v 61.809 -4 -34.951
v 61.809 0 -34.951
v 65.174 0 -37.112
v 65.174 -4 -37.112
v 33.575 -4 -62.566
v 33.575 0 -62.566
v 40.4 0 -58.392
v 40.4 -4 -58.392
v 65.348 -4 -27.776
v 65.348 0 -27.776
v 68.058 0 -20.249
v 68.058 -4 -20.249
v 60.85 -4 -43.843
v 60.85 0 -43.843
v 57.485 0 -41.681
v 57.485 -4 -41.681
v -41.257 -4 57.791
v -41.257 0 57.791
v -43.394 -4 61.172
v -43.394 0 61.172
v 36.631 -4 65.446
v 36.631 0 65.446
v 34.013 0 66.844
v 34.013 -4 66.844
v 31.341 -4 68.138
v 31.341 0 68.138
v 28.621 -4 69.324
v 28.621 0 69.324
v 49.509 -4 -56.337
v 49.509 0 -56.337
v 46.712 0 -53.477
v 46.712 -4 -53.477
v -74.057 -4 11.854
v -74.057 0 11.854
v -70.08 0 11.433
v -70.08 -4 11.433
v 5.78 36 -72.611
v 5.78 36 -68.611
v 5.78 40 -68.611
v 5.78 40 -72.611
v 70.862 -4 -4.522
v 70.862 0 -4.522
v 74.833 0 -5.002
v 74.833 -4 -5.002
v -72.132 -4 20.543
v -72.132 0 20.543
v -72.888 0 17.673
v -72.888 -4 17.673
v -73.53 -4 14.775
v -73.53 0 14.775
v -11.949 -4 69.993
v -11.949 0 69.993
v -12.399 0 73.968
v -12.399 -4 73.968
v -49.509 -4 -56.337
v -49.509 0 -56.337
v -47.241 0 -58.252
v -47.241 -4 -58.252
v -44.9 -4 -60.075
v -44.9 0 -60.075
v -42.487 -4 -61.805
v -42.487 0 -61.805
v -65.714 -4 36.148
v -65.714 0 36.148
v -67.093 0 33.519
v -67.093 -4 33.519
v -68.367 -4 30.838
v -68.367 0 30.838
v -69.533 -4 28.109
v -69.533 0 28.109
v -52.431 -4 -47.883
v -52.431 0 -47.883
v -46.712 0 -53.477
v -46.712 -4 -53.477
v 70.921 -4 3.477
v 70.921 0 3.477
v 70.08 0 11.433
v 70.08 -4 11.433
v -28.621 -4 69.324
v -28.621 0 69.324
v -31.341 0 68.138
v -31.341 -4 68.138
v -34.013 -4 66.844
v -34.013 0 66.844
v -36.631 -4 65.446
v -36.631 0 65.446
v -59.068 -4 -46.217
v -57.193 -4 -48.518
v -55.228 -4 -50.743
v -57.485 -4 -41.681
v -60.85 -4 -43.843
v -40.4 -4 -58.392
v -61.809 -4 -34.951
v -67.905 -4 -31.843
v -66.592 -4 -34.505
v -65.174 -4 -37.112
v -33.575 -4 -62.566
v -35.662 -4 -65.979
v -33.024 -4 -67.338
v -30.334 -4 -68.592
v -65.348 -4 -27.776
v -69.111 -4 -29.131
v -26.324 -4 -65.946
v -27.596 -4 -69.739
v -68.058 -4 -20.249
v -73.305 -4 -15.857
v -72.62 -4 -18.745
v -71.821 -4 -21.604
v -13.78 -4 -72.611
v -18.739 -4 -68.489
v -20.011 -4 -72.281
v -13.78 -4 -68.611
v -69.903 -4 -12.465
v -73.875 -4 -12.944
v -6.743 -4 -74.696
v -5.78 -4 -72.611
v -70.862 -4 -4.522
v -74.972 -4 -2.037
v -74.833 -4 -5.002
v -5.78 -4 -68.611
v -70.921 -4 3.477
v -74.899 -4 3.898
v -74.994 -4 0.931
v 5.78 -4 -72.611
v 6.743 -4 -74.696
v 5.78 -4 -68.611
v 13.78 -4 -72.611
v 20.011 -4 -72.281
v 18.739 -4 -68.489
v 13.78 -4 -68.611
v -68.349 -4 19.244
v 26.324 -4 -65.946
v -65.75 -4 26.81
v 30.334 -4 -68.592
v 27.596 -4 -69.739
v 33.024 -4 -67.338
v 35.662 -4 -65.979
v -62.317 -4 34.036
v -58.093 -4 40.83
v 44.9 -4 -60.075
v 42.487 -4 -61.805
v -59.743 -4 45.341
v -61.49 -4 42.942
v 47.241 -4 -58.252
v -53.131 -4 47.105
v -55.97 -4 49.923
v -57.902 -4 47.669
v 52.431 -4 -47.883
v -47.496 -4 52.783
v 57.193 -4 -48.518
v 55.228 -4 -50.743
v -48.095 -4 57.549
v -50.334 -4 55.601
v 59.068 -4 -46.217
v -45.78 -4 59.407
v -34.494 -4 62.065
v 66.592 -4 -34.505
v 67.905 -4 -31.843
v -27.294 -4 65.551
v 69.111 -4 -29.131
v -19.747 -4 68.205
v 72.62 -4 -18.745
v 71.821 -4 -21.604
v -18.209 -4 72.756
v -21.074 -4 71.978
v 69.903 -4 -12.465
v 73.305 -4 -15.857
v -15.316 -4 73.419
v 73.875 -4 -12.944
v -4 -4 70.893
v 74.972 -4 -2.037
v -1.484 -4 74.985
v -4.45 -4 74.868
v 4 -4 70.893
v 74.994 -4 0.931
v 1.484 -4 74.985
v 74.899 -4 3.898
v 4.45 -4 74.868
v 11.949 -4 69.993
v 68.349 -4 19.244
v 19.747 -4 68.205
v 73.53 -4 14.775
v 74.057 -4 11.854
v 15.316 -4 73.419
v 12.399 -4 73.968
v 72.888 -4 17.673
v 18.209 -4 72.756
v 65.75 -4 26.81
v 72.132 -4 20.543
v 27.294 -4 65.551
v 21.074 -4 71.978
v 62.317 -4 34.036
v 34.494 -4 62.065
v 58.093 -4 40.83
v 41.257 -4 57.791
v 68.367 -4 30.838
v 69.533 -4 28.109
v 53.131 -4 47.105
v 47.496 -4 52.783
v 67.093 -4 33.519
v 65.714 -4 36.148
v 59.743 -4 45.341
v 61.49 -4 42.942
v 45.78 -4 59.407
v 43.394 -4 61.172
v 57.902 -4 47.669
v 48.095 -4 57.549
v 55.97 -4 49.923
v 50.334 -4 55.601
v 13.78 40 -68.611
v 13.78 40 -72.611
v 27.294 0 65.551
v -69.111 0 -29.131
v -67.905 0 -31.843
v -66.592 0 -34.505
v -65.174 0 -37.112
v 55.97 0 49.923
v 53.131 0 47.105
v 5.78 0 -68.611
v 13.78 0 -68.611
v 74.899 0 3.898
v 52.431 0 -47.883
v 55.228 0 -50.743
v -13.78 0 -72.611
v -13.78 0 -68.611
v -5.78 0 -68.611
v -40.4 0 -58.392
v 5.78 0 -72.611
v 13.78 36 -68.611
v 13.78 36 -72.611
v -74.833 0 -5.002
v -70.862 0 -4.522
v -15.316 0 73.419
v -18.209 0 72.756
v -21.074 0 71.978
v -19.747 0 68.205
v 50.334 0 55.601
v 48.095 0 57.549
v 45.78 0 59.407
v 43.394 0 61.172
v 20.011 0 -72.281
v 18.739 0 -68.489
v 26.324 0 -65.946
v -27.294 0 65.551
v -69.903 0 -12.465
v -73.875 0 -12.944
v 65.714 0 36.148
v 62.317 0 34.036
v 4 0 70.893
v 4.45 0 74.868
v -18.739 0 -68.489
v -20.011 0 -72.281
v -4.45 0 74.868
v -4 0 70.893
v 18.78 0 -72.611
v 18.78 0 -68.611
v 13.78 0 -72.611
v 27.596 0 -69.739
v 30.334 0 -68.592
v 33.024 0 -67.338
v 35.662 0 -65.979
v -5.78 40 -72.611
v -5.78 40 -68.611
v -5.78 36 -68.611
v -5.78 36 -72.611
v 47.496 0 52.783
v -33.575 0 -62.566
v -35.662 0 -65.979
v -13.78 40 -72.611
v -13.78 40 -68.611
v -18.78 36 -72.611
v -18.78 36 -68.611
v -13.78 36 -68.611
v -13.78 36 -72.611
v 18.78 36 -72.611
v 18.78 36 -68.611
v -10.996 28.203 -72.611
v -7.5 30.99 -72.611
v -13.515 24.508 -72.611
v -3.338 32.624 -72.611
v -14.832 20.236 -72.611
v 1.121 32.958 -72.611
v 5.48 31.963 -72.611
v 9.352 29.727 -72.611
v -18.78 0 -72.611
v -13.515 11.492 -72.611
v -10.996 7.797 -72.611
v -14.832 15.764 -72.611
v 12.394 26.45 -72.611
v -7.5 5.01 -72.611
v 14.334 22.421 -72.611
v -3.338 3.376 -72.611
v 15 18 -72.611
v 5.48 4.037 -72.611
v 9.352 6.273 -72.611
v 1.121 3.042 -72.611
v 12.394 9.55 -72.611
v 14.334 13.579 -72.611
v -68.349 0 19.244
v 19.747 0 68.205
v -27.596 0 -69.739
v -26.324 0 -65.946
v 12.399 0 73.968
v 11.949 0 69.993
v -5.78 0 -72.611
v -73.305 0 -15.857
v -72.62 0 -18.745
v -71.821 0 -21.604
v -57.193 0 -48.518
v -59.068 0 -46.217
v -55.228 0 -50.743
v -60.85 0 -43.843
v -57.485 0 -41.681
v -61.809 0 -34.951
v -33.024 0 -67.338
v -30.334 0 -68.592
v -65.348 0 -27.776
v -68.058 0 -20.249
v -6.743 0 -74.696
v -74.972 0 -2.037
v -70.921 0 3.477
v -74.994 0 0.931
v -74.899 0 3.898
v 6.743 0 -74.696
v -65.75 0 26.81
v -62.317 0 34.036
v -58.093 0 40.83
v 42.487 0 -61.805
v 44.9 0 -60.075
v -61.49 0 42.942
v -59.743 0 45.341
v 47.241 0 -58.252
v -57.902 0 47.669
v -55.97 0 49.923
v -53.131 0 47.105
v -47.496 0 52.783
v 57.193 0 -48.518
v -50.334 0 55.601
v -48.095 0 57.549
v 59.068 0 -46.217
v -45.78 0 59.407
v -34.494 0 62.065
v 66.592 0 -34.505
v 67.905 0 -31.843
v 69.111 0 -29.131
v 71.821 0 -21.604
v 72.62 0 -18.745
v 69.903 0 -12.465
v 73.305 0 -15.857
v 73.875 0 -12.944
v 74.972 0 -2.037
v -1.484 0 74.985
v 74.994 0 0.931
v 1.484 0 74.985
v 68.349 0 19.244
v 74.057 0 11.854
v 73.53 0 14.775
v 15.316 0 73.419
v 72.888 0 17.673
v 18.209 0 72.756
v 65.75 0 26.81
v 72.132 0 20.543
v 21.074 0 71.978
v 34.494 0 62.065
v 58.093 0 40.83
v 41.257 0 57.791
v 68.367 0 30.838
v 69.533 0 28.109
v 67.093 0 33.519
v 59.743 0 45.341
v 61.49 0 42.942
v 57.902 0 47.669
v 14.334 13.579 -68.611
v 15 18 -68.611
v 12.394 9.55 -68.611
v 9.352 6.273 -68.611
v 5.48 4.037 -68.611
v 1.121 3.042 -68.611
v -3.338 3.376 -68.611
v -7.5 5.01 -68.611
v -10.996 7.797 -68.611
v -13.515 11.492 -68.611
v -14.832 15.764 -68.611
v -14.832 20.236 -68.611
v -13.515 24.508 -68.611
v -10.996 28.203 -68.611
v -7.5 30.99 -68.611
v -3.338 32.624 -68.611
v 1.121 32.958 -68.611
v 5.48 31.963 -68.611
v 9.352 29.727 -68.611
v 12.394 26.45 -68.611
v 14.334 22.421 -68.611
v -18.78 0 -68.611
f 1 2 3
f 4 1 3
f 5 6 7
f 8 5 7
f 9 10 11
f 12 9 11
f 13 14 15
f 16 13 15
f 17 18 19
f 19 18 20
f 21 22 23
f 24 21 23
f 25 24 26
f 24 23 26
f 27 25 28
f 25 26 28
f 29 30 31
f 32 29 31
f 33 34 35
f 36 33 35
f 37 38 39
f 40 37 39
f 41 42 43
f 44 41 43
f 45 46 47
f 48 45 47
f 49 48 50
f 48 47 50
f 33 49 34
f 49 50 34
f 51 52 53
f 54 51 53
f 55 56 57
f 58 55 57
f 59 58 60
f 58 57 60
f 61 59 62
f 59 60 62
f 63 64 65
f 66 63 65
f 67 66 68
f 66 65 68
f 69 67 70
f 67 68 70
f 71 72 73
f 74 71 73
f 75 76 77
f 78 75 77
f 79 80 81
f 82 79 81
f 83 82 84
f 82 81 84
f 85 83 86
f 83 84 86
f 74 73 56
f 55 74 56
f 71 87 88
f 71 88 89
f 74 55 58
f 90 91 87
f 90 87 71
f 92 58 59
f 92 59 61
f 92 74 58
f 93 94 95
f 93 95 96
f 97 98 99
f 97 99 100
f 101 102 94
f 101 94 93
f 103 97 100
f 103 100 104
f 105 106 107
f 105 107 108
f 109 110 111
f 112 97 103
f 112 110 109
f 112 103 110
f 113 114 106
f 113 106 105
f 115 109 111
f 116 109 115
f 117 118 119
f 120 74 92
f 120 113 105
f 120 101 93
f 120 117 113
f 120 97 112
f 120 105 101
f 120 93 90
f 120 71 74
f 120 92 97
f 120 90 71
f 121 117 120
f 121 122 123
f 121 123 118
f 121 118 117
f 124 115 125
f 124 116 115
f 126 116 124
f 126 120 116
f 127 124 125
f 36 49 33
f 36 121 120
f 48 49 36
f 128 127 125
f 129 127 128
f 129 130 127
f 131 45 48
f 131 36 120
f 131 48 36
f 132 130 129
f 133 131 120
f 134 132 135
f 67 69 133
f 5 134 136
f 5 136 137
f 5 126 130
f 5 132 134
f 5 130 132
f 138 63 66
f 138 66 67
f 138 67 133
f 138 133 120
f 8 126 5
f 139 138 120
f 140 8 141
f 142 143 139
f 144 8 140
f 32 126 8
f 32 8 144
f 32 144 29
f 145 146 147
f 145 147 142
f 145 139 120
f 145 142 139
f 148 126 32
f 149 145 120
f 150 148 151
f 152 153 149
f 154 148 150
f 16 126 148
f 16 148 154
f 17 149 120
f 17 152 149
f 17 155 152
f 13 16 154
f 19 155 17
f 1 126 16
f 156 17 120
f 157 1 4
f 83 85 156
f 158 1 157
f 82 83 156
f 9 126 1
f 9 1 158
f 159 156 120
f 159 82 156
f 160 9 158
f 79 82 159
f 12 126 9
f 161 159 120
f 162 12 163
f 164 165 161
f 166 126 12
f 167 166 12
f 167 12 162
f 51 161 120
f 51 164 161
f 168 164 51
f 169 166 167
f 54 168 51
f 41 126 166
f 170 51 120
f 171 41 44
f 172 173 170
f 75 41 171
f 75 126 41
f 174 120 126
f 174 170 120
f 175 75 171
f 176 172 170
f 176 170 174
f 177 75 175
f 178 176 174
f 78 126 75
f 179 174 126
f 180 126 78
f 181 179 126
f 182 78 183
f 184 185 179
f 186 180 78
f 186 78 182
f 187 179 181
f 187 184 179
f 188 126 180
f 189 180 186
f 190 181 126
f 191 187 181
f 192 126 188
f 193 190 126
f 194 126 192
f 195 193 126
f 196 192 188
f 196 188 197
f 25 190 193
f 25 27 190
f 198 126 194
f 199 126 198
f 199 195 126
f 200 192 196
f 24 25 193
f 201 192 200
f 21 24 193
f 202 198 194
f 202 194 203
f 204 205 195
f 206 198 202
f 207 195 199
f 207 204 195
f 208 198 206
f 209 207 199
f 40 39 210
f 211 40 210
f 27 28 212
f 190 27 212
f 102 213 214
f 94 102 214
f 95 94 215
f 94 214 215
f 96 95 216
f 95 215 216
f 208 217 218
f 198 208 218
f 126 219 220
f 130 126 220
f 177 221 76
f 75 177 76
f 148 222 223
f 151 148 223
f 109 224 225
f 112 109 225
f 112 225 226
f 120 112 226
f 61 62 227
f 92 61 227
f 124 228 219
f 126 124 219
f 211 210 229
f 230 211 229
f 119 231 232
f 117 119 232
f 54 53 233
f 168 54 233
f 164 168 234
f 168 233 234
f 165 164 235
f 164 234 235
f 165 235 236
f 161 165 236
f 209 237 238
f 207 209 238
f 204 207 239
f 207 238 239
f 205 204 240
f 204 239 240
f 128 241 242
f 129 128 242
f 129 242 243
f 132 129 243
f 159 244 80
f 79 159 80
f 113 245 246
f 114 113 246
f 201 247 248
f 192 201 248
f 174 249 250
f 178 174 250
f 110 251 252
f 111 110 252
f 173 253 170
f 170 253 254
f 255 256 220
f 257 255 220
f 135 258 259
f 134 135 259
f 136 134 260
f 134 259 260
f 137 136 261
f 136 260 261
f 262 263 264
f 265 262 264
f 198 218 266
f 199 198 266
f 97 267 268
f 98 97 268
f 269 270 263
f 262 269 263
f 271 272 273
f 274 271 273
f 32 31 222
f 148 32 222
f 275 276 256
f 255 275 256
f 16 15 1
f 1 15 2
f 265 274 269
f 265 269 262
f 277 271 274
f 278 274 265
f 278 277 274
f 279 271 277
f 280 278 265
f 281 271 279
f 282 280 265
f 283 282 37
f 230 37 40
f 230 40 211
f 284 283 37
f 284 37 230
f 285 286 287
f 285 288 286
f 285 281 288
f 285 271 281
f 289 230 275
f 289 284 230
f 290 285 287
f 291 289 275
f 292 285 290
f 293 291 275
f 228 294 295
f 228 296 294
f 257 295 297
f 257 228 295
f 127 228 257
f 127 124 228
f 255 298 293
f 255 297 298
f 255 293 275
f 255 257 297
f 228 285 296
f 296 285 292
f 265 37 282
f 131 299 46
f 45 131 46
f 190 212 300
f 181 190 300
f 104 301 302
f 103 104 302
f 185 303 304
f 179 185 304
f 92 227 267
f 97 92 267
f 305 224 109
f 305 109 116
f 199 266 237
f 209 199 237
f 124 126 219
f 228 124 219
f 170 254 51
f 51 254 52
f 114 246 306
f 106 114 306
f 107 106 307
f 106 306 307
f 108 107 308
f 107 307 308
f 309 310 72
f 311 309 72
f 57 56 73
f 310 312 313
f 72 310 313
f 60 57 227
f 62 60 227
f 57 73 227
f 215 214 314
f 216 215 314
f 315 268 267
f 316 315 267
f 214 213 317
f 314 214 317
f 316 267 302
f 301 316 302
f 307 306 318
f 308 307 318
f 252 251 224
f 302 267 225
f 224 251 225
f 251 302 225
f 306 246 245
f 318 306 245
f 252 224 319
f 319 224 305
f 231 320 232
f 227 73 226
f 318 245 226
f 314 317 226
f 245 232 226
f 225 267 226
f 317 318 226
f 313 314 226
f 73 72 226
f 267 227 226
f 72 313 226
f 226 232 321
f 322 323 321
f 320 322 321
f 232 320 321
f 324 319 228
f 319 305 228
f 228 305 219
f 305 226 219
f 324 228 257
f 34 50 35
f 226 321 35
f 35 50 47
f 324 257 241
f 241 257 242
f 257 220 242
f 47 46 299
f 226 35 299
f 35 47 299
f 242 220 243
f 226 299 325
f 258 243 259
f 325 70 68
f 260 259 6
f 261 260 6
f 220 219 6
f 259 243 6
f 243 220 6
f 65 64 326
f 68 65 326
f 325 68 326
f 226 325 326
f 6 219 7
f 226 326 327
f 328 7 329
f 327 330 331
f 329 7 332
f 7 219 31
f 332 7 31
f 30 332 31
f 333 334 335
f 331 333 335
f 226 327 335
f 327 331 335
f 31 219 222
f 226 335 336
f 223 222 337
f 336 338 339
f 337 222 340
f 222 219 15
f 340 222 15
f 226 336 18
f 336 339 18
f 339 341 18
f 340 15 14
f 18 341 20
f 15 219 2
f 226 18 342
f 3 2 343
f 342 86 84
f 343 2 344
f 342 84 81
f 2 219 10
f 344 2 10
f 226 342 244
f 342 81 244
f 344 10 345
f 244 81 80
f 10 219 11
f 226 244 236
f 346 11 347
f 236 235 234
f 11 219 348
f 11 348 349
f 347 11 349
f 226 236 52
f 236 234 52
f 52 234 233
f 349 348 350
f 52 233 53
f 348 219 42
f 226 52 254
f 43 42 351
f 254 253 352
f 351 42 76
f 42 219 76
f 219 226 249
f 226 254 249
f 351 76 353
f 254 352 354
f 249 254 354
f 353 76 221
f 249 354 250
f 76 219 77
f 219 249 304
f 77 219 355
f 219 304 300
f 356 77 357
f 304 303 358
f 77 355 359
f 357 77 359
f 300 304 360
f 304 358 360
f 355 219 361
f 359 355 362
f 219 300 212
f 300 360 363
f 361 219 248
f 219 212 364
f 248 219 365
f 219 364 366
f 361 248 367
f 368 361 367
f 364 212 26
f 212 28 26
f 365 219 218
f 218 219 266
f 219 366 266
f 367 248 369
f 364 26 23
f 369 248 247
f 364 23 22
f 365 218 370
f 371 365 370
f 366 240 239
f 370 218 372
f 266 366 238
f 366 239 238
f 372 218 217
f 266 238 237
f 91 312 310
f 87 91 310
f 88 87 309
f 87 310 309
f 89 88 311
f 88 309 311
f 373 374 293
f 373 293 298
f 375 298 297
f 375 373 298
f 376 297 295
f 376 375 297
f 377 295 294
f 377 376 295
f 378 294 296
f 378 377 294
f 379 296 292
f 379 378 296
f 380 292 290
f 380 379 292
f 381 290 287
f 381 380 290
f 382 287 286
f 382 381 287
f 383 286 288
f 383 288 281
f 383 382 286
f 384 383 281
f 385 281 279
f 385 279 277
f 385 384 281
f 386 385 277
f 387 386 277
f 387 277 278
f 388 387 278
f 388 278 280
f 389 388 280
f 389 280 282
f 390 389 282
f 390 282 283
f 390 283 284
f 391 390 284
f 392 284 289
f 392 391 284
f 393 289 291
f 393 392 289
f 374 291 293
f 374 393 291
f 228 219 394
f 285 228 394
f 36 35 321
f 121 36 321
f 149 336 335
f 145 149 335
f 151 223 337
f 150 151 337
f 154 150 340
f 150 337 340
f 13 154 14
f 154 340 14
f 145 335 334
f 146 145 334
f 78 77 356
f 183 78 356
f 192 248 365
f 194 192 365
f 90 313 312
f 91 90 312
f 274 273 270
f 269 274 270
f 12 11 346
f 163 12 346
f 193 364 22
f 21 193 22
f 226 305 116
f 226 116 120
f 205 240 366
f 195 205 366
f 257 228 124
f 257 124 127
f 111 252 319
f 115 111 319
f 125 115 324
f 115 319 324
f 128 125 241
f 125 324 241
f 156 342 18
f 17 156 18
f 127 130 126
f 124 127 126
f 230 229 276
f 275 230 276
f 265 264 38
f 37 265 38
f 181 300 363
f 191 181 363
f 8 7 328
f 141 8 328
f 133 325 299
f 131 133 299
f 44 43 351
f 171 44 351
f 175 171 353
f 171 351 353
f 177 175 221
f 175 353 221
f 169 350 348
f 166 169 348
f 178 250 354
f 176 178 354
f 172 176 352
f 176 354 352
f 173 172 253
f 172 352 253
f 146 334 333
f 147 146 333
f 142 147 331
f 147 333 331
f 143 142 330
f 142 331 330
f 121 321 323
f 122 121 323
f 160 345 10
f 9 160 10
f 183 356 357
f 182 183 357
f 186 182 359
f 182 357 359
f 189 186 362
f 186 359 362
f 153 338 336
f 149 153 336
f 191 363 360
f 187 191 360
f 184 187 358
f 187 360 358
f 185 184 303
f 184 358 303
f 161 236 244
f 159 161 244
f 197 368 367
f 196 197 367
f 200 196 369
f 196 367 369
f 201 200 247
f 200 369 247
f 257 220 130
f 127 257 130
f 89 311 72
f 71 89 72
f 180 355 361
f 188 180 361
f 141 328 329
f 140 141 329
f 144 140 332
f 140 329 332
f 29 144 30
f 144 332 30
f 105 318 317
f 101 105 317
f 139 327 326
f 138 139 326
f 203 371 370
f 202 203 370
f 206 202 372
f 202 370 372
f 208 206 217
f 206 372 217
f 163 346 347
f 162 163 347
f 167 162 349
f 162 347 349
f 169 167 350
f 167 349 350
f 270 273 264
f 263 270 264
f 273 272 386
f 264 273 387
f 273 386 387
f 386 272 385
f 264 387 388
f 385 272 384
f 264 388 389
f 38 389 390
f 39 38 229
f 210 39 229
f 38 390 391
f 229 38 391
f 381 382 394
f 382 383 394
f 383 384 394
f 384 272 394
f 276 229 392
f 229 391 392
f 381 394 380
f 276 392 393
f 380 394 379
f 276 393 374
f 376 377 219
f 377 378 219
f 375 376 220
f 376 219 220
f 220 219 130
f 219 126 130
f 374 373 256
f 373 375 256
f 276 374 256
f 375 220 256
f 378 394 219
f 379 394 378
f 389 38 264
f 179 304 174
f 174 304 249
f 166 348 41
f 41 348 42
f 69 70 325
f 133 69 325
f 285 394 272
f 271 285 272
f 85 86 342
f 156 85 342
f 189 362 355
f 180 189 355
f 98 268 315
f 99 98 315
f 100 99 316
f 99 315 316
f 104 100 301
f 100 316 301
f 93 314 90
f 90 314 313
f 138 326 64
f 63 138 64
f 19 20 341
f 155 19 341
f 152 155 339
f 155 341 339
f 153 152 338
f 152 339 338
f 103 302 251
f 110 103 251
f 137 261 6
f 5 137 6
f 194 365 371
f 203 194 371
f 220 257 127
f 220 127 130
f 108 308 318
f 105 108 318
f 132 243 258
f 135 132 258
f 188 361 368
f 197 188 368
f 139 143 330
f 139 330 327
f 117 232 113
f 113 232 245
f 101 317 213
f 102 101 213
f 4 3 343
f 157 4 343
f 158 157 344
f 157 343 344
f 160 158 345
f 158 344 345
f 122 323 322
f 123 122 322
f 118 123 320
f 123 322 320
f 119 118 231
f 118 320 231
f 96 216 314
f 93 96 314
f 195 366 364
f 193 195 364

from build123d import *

# Parameters (mm, degrees)
F0_W     = 8
F0_H     = 4
F1_DEPTH = 4
F2_R     = 15
F3_DEPTH = 4


with BuildPart() as f1:
    # F0 (on Front) → F1 (new body)
    with BuildSketch(Plane.XZ):
        with BuildLine():
            Line((-18.739275, -68.488638), (-20.010588, -72.281231))
            ThreePointArc((-20.010588, -72.281231), (0, -75), (20.010588, -72.281231))
            Line((20.010588, -72.281231), (18.739275, -68.488638))
            Line((18.739275, -68.488638), (26.324462, -65.946013))
            Line((26.324462, -65.946013), (27.595775, -69.738606))
            ThreePointArc((27.595775, -69.738606), (31.684936, -67.978414), (35.662457, -65.978703))
            Line((35.662457, -65.978703), (33.575493, -62.566286))
            Line((33.575493, -62.566286), (40.400325, -58.39236))
            Line((40.400325, -58.39236), (42.487289, -61.804776))
            ThreePointArc((42.487289, -61.804776), (46.07948, -59.175008), (49.509311, -56.336738))
            Line((49.509311, -56.336738), (46.712326, -53.477215))
            Line((46.712326, -53.477215), (52.431373, -47.883244))
            Line((52.431373, -47.883244), (55.228358, -50.742768))
            ThreePointArc((55.228358, -50.742768), (58.141764, -47.376526), (60.85031, -43.843355))
            Line((60.85031, -43.843355), (57.484869, -41.681456))
            Line((57.484869, -41.681456), (61.808667, -34.950574))
            Line((61.808667, -34.950574), (65.174108, -37.112473))
            ThreePointArc((65.174108, -37.112473), (67.26127, -33.180137), (69.11144, -29.130892))
            Line((69.11144, -29.130892), (65.347881, -27.776039))
            Line((65.347881, -27.776039), (68.057587, -20.248921))
            Line((68.057587, -20.248921), (71.821146, -21.603774))
            ThreePointArc((71.821146, -21.603774), (72.976425, -17.304374), (73.874575, -12.944001))
            Line((73.874575, -12.944001), (69.903387, -12.464769))
            Line((69.903387, -12.464769), (70.861851, -4.522393))
            Line((70.861851, -4.522393), (74.833039, -5.001625))
            ThreePointArc((74.833039, -5.001625), (74.997963, -0.552769), (74.898634, 3.898034))
            Line((74.898634, 3.898034), (70.920813, 3.47739))
            Line((70.920813, 3.47739), (70.079524, 11.433032))
            Line((70.079524, 11.433032), (74.057345, 11.853676))
            ThreePointArc((74.057345, 11.853676), (73.223565, 16.226813), (72.131785, 20.542775))
            Line((72.131785, 20.542775), (68.348664, 19.243545))
            Line((68.348664, 19.243545), (65.750204, 26.809786))
            Line((65.750204, 26.809786), (69.533324, 28.109016))
            ThreePointArc((69.533324, 28.109016), (67.743042, 32.185094), (65.714069, 36.147768))
            Line((65.714069, 36.147768), (62.317127, 34.035711))
            Line((62.317127, 34.035711), (58.093013, 40.829595))
            Line((58.093013, 40.829595), (61.489955, 42.941652))
            ThreePointArc((61.489955, 42.941652), (58.833783, 46.514363), (55.970312, 49.923183))
            Line((55.970312, 49.923183), (53.131481, 47.105198))
            Line((53.131481, 47.105198), (47.495511, 52.78286))
            Line((47.495511, 52.78286), (50.334342, 55.600845))
            ThreePointArc((50.334342, 55.600845), (46.94672, 58.489362), (43.393682, 61.171794))
            Line((43.393682, 61.171794), (41.256646, 57.79051))
            Line((41.256646, 57.79051), (34.494079, 62.064583))
            Line((34.494079, 62.064583), (36.631116, 65.445866))
            ThreePointArc((36.631116, 65.445866), (32.683503, 67.50399), (28.620731, 69.324265))
            Line((28.620731, 69.324265), (27.293654, 65.550823))
            Line((27.293654, 65.550823), (19.74677, 68.204978))
            Line((19.74677, 68.204978), (21.073847, 71.97842))
            ThreePointArc((21.073847, 71.97842), (16.766049, 73.101981), (12.399175, 73.967969))
            Line((12.399175, 73.967969), (11.949225, 69.993357))
            Line((11.949225, 69.993357), (4, 70.893257))
            Line((4, 70.893257), (4.44995, 74.86787))
            ThreePointArc((4.44995, 74.86787), (0, 75), (-4.44995, 74.86787))
            Line((-4.44995, 74.86787), (-4, 70.893257))
            Line((-4, 70.893257), (-11.949225, 69.993357))
            Line((-11.949225, 69.993357), (-12.399175, 73.967969))
            ThreePointArc((-12.399175, 73.967969), (-16.766049, 73.101981), (-21.073847, 71.97842))
            Line((-21.073847, 71.97842), (-19.74677, 68.204978))
            Line((-19.74677, 68.204978), (-27.293654, 65.550823))
            Line((-27.293654, 65.550823), (-28.620731, 69.324265))
            ThreePointArc((-28.620731, 69.324265), (-32.683503, 67.50399), (-36.631116, 65.445866))
            Line((-36.631116, 65.445866), (-34.494079, 62.064583))
            Line((-34.494079, 62.064583), (-41.256646, 57.79051))
            Line((-41.256646, 57.79051), (-43.393682, 61.171794))
            ThreePointArc((-43.393682, 61.171794), (-46.94672, 58.489362), (-50.334342, 55.600845))
            Line((-50.334342, 55.600845), (-47.495511, 52.78286))
            Line((-47.495511, 52.78286), (-53.131481, 47.105198))
            Line((-53.131481, 47.105198), (-55.970312, 49.923183))
            ThreePointArc((-55.970312, 49.923183), (-58.833783, 46.514363), (-61.489955, 42.941652))
            Line((-61.489955, 42.941652), (-58.093013, 40.829595))
            Line((-58.093013, 40.829595), (-62.317127, 34.035711))
            Line((-62.317127, 34.035711), (-65.714069, 36.147768))
            ThreePointArc((-65.714069, 36.147768), (-67.743042, 32.185094), (-69.533324, 28.109016))
            Line((-69.533324, 28.109016), (-65.750204, 26.809786))
            Line((-65.750204, 26.809786), (-68.348664, 19.243545))
            Line((-68.348664, 19.243545), (-72.131785, 20.542775))
            ThreePointArc((-72.131785, 20.542775), (-73.223565, 16.226813), (-74.057345, 11.853676))
            Line((-74.057345, 11.853676), (-70.079524, 11.433032))
            Line((-70.079524, 11.433032), (-70.920813, 3.47739))
            Line((-70.920813, 3.47739), (-74.898634, 3.898034))
            ThreePointArc((-74.898634, 3.898034), (-74.997963, -0.552769), (-74.833039, -5.001625))
            Line((-74.833039, -5.001625), (-70.861851, -4.522393))
            Line((-70.861851, -4.522393), (-69.903387, -12.464769))
            Line((-69.903387, -12.464769), (-73.874575, -12.944001))
            ThreePointArc((-73.874575, -12.944001), (-72.976425, -17.304374), (-71.821146, -21.603774))
            Line((-71.821146, -21.603774), (-68.057587, -20.248921))
            Line((-68.057587, -20.248921), (-65.347881, -27.776039))
            Line((-65.347881, -27.776039), (-69.11144, -29.130892))
            ThreePointArc((-69.11144, -29.130892), (-67.26127, -33.180137), (-65.174108, -37.112473))
            Line((-65.174108, -37.112473), (-61.808667, -34.950574))
            Line((-61.808667, -34.950574), (-57.484869, -41.681456))
            Line((-57.484869, -41.681456), (-60.85031, -43.843355))
            ThreePointArc((-60.85031, -43.843355), (-58.141764, -47.376526), (-55.228358, -50.742768))
            Line((-55.228358, -50.742768), (-52.431373, -47.883244))
            Line((-52.431373, -47.883244), (-46.712326, -53.477215))
            Line((-46.712326, -53.477215), (-49.509311, -56.336738))
            ThreePointArc((-49.509311, -56.336738), (-46.07948, -59.175008), (-42.487289, -61.804776))
            Line((-42.487289, -61.804776), (-40.400325, -58.39236))
            Line((-40.400325, -58.39236), (-33.575493, -62.566286))
            Line((-33.575493, -62.566286), (-35.662457, -65.978703))
            ThreePointArc((-35.662457, -65.978703), (-31.684936, -67.978414), (-27.595775, -69.738606))
            Line((-27.595775, -69.738606), (-26.324462, -65.946013))
            Line((-26.324462, -65.946013), (-18.739275, -68.488638))
        make_face()
        with Locations((-9.780172, -70.610641)):
            Rectangle(F0_W, F0_H, mode=Mode.SUBTRACT)
        with Locations((9.780172, -70.610641)):
            Rectangle(F0_W, F0_H, mode=Mode.SUBTRACT)
    extrude(amount=F1_DEPTH)


with BuildPart() as f3:
    # F2 (on face) → F3 (new body)
    with BuildSketch(Plane(origin=(0, 0, -68.610641), x_dir=(1, 0, 0), z_dir=(0, 0, -1))):
        Polygon((5.780172, 0), (-5.780172, 0), (-13.780172, 0), (-18.780172, 0), (-18.780172, -36), (-13.780172, -36), (-13.780172, -40), (-5.780172, -40), (-5.780172, -36), (5.780172, -36), (5.780172, -40), (13.780172, -40), (13.780172, -36), (18.780172, -36), (18.780172, 0), (13.780172, 0), (13.780172, 4), (5.780172, 4), align=None)
        with Locations((0, -18)):
            Circle(F2_R, mode=Mode.SUBTRACT)
    extrude(amount=F3_DEPTH)


solid = Compound([f1.part, f3.part])
